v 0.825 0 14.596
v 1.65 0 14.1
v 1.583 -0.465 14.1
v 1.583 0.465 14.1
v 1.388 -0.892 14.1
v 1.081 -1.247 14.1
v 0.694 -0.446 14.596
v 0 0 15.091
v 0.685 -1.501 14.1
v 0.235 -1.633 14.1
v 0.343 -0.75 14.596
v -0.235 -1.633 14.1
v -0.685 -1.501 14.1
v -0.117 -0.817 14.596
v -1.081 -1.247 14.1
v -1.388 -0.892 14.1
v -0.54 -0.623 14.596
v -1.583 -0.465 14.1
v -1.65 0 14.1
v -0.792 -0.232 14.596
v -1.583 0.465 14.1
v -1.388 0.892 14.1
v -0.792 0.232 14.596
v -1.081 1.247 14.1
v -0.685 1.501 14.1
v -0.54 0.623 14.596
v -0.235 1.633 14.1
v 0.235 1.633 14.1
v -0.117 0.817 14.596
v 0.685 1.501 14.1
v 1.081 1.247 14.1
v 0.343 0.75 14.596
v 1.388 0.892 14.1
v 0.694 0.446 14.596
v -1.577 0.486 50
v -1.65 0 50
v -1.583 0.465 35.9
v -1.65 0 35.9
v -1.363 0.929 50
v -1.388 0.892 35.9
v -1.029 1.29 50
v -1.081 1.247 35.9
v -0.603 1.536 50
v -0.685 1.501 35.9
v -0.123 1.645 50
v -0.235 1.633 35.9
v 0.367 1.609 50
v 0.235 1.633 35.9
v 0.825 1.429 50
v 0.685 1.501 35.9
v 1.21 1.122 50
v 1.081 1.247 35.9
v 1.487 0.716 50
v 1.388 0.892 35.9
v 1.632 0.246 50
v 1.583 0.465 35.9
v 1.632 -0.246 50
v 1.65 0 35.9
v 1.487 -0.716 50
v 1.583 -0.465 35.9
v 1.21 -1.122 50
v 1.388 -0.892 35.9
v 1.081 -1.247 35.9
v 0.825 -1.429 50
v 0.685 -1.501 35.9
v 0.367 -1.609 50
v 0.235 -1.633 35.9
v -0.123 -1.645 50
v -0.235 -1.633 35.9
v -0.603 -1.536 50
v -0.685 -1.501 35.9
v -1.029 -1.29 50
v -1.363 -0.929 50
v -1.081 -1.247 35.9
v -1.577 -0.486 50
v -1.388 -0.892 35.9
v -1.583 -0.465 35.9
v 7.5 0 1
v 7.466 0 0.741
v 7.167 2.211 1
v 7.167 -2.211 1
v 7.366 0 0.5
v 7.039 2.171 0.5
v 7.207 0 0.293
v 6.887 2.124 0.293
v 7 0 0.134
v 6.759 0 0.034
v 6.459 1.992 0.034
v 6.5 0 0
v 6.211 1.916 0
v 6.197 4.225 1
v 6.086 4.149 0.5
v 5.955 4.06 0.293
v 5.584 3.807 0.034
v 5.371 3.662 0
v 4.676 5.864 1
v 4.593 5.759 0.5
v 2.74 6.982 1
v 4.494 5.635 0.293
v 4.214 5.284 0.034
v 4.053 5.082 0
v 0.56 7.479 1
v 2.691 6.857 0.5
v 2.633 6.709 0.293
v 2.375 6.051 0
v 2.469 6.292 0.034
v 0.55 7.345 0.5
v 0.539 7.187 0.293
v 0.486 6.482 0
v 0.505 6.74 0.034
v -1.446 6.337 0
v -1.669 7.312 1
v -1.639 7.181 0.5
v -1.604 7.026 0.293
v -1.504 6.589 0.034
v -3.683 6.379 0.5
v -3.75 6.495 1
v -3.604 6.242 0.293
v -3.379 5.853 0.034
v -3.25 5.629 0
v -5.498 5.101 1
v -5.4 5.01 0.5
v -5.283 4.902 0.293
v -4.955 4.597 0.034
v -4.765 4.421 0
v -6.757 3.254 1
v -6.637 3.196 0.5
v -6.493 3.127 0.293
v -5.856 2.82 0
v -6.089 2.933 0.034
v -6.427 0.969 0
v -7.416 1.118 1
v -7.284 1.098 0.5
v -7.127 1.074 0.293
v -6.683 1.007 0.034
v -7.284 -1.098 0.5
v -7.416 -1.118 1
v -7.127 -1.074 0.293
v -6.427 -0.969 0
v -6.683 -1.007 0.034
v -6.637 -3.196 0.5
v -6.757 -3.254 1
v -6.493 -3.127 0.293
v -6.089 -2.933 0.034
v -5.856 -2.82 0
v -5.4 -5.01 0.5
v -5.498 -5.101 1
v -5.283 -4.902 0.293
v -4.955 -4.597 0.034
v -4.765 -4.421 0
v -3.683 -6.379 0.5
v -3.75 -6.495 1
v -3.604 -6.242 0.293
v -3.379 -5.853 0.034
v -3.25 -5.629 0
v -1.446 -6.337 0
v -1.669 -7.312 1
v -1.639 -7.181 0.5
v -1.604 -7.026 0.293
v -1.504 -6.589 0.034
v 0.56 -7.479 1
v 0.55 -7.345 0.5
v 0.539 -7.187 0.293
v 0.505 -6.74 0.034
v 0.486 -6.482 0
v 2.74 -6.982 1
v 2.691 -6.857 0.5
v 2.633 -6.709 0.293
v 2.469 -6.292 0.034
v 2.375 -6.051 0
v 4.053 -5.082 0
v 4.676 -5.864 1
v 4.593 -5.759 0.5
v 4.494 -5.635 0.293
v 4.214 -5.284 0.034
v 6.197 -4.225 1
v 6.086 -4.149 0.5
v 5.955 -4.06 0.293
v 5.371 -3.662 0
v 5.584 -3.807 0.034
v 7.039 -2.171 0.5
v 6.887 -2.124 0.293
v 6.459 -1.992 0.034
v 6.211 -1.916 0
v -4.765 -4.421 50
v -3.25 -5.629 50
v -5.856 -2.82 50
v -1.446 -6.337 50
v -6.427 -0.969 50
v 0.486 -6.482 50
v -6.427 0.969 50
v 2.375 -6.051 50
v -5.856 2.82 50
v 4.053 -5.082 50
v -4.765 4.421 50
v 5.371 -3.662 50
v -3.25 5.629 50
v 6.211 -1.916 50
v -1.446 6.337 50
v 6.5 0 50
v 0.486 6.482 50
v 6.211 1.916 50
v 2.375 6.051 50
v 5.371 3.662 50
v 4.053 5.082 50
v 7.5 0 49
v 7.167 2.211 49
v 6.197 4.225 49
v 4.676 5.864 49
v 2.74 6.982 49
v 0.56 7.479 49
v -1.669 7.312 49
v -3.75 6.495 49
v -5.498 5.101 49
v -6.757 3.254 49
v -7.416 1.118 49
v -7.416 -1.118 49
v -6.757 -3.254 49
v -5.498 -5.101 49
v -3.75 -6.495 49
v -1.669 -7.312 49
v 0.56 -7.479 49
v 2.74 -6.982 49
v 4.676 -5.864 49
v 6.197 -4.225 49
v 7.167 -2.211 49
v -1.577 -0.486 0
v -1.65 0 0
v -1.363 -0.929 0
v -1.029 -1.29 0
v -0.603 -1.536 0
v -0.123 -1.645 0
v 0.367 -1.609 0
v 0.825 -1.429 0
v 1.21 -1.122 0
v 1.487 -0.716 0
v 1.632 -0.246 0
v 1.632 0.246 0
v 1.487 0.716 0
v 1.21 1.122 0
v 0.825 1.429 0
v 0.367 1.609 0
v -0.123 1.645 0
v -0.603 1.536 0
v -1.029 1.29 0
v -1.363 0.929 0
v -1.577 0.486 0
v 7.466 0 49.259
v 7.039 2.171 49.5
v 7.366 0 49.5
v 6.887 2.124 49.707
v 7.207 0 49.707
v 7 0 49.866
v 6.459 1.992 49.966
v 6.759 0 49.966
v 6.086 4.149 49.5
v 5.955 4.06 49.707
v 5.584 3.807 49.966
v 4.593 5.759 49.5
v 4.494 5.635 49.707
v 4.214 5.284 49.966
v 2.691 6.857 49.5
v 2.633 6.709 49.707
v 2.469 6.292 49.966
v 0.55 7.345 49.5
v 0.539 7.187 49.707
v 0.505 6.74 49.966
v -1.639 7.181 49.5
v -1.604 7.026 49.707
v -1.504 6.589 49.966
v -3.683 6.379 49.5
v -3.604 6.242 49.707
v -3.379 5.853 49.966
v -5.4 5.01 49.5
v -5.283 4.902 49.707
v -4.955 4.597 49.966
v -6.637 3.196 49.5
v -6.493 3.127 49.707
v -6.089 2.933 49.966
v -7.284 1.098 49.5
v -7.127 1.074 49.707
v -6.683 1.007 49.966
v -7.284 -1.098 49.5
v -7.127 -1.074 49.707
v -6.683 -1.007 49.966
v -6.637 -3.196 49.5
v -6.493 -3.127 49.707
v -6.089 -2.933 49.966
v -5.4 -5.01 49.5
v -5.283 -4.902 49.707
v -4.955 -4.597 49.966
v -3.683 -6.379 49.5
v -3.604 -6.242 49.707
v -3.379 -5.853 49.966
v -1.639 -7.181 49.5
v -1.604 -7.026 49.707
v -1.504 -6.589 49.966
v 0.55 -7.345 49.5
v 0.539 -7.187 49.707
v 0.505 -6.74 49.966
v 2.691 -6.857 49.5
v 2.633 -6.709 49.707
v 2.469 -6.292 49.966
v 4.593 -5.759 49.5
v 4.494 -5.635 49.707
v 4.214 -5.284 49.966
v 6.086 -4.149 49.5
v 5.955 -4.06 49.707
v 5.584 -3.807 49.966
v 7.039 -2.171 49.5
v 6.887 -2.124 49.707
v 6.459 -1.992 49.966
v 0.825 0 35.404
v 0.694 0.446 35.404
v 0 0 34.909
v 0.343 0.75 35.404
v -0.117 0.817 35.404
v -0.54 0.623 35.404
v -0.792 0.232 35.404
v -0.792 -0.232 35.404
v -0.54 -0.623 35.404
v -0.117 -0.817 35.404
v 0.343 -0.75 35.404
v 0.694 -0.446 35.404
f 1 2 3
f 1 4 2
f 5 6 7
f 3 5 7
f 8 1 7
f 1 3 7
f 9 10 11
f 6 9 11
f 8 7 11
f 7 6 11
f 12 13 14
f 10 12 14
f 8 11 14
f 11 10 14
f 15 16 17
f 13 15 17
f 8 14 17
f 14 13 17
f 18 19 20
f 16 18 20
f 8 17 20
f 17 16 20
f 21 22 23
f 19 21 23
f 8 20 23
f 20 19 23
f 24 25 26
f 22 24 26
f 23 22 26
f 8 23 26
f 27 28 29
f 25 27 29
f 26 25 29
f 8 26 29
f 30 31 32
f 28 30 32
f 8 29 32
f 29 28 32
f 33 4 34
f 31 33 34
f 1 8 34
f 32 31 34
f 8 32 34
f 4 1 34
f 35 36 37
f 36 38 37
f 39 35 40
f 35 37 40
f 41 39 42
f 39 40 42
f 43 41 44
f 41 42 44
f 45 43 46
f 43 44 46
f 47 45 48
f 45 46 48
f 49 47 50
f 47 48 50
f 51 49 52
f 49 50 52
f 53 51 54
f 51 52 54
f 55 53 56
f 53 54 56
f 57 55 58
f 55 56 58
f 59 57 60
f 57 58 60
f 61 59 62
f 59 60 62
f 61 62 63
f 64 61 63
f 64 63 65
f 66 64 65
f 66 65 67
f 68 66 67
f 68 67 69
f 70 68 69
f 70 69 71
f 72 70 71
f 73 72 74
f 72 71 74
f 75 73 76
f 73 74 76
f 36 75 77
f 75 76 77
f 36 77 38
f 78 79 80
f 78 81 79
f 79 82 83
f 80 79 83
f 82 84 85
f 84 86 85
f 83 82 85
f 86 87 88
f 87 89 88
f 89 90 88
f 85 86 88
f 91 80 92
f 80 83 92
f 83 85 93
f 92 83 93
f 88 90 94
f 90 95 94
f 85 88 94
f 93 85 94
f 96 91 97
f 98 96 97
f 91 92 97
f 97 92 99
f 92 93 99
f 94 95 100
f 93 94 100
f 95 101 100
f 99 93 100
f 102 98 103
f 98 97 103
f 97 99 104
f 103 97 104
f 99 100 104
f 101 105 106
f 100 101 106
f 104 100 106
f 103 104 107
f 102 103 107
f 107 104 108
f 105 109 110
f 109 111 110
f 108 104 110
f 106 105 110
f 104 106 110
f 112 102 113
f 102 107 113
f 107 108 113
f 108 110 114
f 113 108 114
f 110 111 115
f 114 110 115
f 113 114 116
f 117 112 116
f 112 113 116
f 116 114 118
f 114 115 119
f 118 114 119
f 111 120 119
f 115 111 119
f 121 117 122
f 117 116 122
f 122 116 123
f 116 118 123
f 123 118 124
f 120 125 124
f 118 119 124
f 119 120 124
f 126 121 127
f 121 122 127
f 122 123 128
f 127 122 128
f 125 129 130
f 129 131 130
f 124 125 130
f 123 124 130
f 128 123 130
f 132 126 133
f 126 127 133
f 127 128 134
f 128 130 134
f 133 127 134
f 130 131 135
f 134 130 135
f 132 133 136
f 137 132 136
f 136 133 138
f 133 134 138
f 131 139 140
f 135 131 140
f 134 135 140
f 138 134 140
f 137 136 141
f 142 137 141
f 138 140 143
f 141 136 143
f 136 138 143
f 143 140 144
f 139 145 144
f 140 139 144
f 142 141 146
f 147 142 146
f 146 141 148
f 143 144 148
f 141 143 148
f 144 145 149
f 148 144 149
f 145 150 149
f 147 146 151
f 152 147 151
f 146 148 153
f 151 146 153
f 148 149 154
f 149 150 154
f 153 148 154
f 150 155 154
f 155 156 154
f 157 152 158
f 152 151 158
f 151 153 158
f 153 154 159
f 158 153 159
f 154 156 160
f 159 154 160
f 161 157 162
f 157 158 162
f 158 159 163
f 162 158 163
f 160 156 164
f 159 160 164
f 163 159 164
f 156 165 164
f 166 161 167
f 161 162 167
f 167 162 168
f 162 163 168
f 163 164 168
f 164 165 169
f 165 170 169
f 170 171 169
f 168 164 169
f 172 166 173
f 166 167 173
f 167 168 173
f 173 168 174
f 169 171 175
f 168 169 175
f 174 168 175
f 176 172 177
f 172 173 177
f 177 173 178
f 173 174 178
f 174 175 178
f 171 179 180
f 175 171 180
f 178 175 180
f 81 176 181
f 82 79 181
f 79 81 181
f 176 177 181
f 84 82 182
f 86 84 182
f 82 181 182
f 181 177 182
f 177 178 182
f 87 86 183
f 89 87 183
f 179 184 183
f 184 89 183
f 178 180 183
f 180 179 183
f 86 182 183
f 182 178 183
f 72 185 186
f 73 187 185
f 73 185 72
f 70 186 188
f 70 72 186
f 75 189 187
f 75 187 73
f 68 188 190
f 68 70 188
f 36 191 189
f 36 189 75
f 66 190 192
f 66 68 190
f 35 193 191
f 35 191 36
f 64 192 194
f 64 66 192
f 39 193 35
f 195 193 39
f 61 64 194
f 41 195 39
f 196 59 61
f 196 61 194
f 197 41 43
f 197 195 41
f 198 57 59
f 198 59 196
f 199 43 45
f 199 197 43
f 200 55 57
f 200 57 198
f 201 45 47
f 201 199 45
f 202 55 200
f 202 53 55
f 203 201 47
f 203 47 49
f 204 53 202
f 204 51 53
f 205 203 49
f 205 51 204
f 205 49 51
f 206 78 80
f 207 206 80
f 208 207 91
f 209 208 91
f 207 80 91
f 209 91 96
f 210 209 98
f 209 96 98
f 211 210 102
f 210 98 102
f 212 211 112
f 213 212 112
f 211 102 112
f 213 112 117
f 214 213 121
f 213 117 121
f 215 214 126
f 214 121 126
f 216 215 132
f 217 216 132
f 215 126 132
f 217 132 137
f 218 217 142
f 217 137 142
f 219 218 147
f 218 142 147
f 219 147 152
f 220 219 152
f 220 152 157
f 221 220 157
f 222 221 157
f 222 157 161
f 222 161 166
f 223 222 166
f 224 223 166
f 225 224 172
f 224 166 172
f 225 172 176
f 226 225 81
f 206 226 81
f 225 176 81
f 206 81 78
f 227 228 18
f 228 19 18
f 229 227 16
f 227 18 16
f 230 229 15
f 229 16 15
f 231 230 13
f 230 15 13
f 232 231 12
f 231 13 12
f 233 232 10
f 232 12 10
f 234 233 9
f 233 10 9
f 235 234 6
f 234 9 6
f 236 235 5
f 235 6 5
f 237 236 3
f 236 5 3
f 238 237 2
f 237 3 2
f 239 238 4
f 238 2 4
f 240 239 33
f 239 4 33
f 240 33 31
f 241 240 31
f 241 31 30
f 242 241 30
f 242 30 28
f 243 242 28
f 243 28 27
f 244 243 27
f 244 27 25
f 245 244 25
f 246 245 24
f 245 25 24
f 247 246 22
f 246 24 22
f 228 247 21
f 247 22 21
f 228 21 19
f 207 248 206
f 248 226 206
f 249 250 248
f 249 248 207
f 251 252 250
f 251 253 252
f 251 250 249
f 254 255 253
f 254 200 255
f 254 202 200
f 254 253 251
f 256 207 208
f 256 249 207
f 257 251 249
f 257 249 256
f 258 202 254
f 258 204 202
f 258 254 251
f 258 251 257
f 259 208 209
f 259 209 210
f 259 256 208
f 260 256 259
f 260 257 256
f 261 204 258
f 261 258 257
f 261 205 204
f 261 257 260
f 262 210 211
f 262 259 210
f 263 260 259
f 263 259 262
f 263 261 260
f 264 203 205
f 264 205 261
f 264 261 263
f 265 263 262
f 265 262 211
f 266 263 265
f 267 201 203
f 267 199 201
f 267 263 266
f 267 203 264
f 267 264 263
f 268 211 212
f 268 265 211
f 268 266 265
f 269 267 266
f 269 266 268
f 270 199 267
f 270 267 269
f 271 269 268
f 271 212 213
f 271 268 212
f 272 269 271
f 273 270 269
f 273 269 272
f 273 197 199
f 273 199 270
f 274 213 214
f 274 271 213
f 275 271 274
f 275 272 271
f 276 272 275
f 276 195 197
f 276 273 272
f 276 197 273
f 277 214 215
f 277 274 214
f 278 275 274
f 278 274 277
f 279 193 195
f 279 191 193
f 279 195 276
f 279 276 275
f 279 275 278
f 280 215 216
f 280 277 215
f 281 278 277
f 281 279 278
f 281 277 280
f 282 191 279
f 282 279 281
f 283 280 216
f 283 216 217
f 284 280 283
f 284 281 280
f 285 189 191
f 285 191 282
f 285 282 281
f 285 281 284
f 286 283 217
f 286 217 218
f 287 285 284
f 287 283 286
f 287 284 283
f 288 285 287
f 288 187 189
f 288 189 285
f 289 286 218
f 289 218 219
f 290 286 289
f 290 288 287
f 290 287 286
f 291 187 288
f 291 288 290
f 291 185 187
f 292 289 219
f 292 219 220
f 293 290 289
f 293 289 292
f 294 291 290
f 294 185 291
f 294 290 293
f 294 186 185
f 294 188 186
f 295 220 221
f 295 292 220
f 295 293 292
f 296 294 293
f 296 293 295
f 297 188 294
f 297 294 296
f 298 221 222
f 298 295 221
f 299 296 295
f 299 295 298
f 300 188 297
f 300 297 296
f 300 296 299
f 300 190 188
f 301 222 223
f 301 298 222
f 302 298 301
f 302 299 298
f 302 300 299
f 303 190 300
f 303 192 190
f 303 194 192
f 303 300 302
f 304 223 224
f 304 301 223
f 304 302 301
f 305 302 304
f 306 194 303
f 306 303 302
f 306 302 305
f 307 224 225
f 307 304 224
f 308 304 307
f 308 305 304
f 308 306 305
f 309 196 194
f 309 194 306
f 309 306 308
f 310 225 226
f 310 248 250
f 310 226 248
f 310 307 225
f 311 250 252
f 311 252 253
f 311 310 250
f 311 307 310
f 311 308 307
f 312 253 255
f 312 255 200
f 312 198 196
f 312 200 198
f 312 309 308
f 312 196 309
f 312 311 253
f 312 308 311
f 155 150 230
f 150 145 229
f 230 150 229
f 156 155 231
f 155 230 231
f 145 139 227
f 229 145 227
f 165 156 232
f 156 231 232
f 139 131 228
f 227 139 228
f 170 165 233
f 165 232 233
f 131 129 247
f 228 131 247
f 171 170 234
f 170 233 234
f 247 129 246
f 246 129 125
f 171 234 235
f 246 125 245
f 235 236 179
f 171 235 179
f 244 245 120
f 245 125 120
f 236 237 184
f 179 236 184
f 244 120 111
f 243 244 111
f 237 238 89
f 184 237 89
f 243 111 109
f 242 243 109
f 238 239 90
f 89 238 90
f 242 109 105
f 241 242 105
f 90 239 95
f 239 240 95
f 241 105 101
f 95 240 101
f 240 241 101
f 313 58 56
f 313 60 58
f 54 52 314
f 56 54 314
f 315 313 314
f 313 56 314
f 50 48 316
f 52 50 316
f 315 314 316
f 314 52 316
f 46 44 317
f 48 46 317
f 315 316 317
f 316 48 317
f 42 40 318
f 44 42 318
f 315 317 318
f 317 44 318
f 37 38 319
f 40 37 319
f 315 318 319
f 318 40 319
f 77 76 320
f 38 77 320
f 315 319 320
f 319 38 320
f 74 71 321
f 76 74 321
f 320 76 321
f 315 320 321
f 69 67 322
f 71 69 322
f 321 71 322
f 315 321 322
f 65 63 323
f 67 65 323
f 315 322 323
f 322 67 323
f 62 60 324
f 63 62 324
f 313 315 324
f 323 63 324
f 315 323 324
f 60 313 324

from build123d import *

# Parameters (mm, degrees)
F0_R     = 7.5
F1_DEPTH = 50
F2_R     = 1
F4_D     = 3.3
F4_DEPTH = 14.1
F4_TIP   = 0.9914200214
F6_D     = 3.3
F6_DEPTH = 14.1
F6_TIP   = 0.9914200214


with BuildPart() as f1:
    # F0 (on Top) → F1 (new body)
    with BuildSketch(Plane.XY):
        Circle(F0_R)
    extrude(amount=F1_DEPTH)

    # F2
    f2_edges = [f1.edges().sort_by_distance(p)[0] for p in [
        (-7.5, 0, 50),
        (-7.5, 0, 0),
    ]]
    fillet(f2_edges, radius=F2_R)

    # F4
    with Locations(Plane.XY.offset(50)):
        with Locations((0, 0)):
            Hole(F4_D / 2, depth=F4_DEPTH)
            with Locations((0, 0, -(F4_DEPTH + F4_TIP / 2))):  # 118° drill point
                Cone(0, F4_D / 2, F4_TIP, mode=Mode.SUBTRACT)

    # F6
    with Locations(Plane(origin=(0, 0, 0), x_dir=(1, 0, 0), z_dir=(0, 0, -1))):
        with Locations((0, 0)):
            Hole(F6_D / 2, depth=F6_DEPTH)
            with Locations((0, 0, -(F6_DEPTH + F6_TIP / 2))):  # 118° drill point
                Cone(0, F6_D / 2, F6_TIP, mode=Mode.SUBTRACT)


solid = f1.part
